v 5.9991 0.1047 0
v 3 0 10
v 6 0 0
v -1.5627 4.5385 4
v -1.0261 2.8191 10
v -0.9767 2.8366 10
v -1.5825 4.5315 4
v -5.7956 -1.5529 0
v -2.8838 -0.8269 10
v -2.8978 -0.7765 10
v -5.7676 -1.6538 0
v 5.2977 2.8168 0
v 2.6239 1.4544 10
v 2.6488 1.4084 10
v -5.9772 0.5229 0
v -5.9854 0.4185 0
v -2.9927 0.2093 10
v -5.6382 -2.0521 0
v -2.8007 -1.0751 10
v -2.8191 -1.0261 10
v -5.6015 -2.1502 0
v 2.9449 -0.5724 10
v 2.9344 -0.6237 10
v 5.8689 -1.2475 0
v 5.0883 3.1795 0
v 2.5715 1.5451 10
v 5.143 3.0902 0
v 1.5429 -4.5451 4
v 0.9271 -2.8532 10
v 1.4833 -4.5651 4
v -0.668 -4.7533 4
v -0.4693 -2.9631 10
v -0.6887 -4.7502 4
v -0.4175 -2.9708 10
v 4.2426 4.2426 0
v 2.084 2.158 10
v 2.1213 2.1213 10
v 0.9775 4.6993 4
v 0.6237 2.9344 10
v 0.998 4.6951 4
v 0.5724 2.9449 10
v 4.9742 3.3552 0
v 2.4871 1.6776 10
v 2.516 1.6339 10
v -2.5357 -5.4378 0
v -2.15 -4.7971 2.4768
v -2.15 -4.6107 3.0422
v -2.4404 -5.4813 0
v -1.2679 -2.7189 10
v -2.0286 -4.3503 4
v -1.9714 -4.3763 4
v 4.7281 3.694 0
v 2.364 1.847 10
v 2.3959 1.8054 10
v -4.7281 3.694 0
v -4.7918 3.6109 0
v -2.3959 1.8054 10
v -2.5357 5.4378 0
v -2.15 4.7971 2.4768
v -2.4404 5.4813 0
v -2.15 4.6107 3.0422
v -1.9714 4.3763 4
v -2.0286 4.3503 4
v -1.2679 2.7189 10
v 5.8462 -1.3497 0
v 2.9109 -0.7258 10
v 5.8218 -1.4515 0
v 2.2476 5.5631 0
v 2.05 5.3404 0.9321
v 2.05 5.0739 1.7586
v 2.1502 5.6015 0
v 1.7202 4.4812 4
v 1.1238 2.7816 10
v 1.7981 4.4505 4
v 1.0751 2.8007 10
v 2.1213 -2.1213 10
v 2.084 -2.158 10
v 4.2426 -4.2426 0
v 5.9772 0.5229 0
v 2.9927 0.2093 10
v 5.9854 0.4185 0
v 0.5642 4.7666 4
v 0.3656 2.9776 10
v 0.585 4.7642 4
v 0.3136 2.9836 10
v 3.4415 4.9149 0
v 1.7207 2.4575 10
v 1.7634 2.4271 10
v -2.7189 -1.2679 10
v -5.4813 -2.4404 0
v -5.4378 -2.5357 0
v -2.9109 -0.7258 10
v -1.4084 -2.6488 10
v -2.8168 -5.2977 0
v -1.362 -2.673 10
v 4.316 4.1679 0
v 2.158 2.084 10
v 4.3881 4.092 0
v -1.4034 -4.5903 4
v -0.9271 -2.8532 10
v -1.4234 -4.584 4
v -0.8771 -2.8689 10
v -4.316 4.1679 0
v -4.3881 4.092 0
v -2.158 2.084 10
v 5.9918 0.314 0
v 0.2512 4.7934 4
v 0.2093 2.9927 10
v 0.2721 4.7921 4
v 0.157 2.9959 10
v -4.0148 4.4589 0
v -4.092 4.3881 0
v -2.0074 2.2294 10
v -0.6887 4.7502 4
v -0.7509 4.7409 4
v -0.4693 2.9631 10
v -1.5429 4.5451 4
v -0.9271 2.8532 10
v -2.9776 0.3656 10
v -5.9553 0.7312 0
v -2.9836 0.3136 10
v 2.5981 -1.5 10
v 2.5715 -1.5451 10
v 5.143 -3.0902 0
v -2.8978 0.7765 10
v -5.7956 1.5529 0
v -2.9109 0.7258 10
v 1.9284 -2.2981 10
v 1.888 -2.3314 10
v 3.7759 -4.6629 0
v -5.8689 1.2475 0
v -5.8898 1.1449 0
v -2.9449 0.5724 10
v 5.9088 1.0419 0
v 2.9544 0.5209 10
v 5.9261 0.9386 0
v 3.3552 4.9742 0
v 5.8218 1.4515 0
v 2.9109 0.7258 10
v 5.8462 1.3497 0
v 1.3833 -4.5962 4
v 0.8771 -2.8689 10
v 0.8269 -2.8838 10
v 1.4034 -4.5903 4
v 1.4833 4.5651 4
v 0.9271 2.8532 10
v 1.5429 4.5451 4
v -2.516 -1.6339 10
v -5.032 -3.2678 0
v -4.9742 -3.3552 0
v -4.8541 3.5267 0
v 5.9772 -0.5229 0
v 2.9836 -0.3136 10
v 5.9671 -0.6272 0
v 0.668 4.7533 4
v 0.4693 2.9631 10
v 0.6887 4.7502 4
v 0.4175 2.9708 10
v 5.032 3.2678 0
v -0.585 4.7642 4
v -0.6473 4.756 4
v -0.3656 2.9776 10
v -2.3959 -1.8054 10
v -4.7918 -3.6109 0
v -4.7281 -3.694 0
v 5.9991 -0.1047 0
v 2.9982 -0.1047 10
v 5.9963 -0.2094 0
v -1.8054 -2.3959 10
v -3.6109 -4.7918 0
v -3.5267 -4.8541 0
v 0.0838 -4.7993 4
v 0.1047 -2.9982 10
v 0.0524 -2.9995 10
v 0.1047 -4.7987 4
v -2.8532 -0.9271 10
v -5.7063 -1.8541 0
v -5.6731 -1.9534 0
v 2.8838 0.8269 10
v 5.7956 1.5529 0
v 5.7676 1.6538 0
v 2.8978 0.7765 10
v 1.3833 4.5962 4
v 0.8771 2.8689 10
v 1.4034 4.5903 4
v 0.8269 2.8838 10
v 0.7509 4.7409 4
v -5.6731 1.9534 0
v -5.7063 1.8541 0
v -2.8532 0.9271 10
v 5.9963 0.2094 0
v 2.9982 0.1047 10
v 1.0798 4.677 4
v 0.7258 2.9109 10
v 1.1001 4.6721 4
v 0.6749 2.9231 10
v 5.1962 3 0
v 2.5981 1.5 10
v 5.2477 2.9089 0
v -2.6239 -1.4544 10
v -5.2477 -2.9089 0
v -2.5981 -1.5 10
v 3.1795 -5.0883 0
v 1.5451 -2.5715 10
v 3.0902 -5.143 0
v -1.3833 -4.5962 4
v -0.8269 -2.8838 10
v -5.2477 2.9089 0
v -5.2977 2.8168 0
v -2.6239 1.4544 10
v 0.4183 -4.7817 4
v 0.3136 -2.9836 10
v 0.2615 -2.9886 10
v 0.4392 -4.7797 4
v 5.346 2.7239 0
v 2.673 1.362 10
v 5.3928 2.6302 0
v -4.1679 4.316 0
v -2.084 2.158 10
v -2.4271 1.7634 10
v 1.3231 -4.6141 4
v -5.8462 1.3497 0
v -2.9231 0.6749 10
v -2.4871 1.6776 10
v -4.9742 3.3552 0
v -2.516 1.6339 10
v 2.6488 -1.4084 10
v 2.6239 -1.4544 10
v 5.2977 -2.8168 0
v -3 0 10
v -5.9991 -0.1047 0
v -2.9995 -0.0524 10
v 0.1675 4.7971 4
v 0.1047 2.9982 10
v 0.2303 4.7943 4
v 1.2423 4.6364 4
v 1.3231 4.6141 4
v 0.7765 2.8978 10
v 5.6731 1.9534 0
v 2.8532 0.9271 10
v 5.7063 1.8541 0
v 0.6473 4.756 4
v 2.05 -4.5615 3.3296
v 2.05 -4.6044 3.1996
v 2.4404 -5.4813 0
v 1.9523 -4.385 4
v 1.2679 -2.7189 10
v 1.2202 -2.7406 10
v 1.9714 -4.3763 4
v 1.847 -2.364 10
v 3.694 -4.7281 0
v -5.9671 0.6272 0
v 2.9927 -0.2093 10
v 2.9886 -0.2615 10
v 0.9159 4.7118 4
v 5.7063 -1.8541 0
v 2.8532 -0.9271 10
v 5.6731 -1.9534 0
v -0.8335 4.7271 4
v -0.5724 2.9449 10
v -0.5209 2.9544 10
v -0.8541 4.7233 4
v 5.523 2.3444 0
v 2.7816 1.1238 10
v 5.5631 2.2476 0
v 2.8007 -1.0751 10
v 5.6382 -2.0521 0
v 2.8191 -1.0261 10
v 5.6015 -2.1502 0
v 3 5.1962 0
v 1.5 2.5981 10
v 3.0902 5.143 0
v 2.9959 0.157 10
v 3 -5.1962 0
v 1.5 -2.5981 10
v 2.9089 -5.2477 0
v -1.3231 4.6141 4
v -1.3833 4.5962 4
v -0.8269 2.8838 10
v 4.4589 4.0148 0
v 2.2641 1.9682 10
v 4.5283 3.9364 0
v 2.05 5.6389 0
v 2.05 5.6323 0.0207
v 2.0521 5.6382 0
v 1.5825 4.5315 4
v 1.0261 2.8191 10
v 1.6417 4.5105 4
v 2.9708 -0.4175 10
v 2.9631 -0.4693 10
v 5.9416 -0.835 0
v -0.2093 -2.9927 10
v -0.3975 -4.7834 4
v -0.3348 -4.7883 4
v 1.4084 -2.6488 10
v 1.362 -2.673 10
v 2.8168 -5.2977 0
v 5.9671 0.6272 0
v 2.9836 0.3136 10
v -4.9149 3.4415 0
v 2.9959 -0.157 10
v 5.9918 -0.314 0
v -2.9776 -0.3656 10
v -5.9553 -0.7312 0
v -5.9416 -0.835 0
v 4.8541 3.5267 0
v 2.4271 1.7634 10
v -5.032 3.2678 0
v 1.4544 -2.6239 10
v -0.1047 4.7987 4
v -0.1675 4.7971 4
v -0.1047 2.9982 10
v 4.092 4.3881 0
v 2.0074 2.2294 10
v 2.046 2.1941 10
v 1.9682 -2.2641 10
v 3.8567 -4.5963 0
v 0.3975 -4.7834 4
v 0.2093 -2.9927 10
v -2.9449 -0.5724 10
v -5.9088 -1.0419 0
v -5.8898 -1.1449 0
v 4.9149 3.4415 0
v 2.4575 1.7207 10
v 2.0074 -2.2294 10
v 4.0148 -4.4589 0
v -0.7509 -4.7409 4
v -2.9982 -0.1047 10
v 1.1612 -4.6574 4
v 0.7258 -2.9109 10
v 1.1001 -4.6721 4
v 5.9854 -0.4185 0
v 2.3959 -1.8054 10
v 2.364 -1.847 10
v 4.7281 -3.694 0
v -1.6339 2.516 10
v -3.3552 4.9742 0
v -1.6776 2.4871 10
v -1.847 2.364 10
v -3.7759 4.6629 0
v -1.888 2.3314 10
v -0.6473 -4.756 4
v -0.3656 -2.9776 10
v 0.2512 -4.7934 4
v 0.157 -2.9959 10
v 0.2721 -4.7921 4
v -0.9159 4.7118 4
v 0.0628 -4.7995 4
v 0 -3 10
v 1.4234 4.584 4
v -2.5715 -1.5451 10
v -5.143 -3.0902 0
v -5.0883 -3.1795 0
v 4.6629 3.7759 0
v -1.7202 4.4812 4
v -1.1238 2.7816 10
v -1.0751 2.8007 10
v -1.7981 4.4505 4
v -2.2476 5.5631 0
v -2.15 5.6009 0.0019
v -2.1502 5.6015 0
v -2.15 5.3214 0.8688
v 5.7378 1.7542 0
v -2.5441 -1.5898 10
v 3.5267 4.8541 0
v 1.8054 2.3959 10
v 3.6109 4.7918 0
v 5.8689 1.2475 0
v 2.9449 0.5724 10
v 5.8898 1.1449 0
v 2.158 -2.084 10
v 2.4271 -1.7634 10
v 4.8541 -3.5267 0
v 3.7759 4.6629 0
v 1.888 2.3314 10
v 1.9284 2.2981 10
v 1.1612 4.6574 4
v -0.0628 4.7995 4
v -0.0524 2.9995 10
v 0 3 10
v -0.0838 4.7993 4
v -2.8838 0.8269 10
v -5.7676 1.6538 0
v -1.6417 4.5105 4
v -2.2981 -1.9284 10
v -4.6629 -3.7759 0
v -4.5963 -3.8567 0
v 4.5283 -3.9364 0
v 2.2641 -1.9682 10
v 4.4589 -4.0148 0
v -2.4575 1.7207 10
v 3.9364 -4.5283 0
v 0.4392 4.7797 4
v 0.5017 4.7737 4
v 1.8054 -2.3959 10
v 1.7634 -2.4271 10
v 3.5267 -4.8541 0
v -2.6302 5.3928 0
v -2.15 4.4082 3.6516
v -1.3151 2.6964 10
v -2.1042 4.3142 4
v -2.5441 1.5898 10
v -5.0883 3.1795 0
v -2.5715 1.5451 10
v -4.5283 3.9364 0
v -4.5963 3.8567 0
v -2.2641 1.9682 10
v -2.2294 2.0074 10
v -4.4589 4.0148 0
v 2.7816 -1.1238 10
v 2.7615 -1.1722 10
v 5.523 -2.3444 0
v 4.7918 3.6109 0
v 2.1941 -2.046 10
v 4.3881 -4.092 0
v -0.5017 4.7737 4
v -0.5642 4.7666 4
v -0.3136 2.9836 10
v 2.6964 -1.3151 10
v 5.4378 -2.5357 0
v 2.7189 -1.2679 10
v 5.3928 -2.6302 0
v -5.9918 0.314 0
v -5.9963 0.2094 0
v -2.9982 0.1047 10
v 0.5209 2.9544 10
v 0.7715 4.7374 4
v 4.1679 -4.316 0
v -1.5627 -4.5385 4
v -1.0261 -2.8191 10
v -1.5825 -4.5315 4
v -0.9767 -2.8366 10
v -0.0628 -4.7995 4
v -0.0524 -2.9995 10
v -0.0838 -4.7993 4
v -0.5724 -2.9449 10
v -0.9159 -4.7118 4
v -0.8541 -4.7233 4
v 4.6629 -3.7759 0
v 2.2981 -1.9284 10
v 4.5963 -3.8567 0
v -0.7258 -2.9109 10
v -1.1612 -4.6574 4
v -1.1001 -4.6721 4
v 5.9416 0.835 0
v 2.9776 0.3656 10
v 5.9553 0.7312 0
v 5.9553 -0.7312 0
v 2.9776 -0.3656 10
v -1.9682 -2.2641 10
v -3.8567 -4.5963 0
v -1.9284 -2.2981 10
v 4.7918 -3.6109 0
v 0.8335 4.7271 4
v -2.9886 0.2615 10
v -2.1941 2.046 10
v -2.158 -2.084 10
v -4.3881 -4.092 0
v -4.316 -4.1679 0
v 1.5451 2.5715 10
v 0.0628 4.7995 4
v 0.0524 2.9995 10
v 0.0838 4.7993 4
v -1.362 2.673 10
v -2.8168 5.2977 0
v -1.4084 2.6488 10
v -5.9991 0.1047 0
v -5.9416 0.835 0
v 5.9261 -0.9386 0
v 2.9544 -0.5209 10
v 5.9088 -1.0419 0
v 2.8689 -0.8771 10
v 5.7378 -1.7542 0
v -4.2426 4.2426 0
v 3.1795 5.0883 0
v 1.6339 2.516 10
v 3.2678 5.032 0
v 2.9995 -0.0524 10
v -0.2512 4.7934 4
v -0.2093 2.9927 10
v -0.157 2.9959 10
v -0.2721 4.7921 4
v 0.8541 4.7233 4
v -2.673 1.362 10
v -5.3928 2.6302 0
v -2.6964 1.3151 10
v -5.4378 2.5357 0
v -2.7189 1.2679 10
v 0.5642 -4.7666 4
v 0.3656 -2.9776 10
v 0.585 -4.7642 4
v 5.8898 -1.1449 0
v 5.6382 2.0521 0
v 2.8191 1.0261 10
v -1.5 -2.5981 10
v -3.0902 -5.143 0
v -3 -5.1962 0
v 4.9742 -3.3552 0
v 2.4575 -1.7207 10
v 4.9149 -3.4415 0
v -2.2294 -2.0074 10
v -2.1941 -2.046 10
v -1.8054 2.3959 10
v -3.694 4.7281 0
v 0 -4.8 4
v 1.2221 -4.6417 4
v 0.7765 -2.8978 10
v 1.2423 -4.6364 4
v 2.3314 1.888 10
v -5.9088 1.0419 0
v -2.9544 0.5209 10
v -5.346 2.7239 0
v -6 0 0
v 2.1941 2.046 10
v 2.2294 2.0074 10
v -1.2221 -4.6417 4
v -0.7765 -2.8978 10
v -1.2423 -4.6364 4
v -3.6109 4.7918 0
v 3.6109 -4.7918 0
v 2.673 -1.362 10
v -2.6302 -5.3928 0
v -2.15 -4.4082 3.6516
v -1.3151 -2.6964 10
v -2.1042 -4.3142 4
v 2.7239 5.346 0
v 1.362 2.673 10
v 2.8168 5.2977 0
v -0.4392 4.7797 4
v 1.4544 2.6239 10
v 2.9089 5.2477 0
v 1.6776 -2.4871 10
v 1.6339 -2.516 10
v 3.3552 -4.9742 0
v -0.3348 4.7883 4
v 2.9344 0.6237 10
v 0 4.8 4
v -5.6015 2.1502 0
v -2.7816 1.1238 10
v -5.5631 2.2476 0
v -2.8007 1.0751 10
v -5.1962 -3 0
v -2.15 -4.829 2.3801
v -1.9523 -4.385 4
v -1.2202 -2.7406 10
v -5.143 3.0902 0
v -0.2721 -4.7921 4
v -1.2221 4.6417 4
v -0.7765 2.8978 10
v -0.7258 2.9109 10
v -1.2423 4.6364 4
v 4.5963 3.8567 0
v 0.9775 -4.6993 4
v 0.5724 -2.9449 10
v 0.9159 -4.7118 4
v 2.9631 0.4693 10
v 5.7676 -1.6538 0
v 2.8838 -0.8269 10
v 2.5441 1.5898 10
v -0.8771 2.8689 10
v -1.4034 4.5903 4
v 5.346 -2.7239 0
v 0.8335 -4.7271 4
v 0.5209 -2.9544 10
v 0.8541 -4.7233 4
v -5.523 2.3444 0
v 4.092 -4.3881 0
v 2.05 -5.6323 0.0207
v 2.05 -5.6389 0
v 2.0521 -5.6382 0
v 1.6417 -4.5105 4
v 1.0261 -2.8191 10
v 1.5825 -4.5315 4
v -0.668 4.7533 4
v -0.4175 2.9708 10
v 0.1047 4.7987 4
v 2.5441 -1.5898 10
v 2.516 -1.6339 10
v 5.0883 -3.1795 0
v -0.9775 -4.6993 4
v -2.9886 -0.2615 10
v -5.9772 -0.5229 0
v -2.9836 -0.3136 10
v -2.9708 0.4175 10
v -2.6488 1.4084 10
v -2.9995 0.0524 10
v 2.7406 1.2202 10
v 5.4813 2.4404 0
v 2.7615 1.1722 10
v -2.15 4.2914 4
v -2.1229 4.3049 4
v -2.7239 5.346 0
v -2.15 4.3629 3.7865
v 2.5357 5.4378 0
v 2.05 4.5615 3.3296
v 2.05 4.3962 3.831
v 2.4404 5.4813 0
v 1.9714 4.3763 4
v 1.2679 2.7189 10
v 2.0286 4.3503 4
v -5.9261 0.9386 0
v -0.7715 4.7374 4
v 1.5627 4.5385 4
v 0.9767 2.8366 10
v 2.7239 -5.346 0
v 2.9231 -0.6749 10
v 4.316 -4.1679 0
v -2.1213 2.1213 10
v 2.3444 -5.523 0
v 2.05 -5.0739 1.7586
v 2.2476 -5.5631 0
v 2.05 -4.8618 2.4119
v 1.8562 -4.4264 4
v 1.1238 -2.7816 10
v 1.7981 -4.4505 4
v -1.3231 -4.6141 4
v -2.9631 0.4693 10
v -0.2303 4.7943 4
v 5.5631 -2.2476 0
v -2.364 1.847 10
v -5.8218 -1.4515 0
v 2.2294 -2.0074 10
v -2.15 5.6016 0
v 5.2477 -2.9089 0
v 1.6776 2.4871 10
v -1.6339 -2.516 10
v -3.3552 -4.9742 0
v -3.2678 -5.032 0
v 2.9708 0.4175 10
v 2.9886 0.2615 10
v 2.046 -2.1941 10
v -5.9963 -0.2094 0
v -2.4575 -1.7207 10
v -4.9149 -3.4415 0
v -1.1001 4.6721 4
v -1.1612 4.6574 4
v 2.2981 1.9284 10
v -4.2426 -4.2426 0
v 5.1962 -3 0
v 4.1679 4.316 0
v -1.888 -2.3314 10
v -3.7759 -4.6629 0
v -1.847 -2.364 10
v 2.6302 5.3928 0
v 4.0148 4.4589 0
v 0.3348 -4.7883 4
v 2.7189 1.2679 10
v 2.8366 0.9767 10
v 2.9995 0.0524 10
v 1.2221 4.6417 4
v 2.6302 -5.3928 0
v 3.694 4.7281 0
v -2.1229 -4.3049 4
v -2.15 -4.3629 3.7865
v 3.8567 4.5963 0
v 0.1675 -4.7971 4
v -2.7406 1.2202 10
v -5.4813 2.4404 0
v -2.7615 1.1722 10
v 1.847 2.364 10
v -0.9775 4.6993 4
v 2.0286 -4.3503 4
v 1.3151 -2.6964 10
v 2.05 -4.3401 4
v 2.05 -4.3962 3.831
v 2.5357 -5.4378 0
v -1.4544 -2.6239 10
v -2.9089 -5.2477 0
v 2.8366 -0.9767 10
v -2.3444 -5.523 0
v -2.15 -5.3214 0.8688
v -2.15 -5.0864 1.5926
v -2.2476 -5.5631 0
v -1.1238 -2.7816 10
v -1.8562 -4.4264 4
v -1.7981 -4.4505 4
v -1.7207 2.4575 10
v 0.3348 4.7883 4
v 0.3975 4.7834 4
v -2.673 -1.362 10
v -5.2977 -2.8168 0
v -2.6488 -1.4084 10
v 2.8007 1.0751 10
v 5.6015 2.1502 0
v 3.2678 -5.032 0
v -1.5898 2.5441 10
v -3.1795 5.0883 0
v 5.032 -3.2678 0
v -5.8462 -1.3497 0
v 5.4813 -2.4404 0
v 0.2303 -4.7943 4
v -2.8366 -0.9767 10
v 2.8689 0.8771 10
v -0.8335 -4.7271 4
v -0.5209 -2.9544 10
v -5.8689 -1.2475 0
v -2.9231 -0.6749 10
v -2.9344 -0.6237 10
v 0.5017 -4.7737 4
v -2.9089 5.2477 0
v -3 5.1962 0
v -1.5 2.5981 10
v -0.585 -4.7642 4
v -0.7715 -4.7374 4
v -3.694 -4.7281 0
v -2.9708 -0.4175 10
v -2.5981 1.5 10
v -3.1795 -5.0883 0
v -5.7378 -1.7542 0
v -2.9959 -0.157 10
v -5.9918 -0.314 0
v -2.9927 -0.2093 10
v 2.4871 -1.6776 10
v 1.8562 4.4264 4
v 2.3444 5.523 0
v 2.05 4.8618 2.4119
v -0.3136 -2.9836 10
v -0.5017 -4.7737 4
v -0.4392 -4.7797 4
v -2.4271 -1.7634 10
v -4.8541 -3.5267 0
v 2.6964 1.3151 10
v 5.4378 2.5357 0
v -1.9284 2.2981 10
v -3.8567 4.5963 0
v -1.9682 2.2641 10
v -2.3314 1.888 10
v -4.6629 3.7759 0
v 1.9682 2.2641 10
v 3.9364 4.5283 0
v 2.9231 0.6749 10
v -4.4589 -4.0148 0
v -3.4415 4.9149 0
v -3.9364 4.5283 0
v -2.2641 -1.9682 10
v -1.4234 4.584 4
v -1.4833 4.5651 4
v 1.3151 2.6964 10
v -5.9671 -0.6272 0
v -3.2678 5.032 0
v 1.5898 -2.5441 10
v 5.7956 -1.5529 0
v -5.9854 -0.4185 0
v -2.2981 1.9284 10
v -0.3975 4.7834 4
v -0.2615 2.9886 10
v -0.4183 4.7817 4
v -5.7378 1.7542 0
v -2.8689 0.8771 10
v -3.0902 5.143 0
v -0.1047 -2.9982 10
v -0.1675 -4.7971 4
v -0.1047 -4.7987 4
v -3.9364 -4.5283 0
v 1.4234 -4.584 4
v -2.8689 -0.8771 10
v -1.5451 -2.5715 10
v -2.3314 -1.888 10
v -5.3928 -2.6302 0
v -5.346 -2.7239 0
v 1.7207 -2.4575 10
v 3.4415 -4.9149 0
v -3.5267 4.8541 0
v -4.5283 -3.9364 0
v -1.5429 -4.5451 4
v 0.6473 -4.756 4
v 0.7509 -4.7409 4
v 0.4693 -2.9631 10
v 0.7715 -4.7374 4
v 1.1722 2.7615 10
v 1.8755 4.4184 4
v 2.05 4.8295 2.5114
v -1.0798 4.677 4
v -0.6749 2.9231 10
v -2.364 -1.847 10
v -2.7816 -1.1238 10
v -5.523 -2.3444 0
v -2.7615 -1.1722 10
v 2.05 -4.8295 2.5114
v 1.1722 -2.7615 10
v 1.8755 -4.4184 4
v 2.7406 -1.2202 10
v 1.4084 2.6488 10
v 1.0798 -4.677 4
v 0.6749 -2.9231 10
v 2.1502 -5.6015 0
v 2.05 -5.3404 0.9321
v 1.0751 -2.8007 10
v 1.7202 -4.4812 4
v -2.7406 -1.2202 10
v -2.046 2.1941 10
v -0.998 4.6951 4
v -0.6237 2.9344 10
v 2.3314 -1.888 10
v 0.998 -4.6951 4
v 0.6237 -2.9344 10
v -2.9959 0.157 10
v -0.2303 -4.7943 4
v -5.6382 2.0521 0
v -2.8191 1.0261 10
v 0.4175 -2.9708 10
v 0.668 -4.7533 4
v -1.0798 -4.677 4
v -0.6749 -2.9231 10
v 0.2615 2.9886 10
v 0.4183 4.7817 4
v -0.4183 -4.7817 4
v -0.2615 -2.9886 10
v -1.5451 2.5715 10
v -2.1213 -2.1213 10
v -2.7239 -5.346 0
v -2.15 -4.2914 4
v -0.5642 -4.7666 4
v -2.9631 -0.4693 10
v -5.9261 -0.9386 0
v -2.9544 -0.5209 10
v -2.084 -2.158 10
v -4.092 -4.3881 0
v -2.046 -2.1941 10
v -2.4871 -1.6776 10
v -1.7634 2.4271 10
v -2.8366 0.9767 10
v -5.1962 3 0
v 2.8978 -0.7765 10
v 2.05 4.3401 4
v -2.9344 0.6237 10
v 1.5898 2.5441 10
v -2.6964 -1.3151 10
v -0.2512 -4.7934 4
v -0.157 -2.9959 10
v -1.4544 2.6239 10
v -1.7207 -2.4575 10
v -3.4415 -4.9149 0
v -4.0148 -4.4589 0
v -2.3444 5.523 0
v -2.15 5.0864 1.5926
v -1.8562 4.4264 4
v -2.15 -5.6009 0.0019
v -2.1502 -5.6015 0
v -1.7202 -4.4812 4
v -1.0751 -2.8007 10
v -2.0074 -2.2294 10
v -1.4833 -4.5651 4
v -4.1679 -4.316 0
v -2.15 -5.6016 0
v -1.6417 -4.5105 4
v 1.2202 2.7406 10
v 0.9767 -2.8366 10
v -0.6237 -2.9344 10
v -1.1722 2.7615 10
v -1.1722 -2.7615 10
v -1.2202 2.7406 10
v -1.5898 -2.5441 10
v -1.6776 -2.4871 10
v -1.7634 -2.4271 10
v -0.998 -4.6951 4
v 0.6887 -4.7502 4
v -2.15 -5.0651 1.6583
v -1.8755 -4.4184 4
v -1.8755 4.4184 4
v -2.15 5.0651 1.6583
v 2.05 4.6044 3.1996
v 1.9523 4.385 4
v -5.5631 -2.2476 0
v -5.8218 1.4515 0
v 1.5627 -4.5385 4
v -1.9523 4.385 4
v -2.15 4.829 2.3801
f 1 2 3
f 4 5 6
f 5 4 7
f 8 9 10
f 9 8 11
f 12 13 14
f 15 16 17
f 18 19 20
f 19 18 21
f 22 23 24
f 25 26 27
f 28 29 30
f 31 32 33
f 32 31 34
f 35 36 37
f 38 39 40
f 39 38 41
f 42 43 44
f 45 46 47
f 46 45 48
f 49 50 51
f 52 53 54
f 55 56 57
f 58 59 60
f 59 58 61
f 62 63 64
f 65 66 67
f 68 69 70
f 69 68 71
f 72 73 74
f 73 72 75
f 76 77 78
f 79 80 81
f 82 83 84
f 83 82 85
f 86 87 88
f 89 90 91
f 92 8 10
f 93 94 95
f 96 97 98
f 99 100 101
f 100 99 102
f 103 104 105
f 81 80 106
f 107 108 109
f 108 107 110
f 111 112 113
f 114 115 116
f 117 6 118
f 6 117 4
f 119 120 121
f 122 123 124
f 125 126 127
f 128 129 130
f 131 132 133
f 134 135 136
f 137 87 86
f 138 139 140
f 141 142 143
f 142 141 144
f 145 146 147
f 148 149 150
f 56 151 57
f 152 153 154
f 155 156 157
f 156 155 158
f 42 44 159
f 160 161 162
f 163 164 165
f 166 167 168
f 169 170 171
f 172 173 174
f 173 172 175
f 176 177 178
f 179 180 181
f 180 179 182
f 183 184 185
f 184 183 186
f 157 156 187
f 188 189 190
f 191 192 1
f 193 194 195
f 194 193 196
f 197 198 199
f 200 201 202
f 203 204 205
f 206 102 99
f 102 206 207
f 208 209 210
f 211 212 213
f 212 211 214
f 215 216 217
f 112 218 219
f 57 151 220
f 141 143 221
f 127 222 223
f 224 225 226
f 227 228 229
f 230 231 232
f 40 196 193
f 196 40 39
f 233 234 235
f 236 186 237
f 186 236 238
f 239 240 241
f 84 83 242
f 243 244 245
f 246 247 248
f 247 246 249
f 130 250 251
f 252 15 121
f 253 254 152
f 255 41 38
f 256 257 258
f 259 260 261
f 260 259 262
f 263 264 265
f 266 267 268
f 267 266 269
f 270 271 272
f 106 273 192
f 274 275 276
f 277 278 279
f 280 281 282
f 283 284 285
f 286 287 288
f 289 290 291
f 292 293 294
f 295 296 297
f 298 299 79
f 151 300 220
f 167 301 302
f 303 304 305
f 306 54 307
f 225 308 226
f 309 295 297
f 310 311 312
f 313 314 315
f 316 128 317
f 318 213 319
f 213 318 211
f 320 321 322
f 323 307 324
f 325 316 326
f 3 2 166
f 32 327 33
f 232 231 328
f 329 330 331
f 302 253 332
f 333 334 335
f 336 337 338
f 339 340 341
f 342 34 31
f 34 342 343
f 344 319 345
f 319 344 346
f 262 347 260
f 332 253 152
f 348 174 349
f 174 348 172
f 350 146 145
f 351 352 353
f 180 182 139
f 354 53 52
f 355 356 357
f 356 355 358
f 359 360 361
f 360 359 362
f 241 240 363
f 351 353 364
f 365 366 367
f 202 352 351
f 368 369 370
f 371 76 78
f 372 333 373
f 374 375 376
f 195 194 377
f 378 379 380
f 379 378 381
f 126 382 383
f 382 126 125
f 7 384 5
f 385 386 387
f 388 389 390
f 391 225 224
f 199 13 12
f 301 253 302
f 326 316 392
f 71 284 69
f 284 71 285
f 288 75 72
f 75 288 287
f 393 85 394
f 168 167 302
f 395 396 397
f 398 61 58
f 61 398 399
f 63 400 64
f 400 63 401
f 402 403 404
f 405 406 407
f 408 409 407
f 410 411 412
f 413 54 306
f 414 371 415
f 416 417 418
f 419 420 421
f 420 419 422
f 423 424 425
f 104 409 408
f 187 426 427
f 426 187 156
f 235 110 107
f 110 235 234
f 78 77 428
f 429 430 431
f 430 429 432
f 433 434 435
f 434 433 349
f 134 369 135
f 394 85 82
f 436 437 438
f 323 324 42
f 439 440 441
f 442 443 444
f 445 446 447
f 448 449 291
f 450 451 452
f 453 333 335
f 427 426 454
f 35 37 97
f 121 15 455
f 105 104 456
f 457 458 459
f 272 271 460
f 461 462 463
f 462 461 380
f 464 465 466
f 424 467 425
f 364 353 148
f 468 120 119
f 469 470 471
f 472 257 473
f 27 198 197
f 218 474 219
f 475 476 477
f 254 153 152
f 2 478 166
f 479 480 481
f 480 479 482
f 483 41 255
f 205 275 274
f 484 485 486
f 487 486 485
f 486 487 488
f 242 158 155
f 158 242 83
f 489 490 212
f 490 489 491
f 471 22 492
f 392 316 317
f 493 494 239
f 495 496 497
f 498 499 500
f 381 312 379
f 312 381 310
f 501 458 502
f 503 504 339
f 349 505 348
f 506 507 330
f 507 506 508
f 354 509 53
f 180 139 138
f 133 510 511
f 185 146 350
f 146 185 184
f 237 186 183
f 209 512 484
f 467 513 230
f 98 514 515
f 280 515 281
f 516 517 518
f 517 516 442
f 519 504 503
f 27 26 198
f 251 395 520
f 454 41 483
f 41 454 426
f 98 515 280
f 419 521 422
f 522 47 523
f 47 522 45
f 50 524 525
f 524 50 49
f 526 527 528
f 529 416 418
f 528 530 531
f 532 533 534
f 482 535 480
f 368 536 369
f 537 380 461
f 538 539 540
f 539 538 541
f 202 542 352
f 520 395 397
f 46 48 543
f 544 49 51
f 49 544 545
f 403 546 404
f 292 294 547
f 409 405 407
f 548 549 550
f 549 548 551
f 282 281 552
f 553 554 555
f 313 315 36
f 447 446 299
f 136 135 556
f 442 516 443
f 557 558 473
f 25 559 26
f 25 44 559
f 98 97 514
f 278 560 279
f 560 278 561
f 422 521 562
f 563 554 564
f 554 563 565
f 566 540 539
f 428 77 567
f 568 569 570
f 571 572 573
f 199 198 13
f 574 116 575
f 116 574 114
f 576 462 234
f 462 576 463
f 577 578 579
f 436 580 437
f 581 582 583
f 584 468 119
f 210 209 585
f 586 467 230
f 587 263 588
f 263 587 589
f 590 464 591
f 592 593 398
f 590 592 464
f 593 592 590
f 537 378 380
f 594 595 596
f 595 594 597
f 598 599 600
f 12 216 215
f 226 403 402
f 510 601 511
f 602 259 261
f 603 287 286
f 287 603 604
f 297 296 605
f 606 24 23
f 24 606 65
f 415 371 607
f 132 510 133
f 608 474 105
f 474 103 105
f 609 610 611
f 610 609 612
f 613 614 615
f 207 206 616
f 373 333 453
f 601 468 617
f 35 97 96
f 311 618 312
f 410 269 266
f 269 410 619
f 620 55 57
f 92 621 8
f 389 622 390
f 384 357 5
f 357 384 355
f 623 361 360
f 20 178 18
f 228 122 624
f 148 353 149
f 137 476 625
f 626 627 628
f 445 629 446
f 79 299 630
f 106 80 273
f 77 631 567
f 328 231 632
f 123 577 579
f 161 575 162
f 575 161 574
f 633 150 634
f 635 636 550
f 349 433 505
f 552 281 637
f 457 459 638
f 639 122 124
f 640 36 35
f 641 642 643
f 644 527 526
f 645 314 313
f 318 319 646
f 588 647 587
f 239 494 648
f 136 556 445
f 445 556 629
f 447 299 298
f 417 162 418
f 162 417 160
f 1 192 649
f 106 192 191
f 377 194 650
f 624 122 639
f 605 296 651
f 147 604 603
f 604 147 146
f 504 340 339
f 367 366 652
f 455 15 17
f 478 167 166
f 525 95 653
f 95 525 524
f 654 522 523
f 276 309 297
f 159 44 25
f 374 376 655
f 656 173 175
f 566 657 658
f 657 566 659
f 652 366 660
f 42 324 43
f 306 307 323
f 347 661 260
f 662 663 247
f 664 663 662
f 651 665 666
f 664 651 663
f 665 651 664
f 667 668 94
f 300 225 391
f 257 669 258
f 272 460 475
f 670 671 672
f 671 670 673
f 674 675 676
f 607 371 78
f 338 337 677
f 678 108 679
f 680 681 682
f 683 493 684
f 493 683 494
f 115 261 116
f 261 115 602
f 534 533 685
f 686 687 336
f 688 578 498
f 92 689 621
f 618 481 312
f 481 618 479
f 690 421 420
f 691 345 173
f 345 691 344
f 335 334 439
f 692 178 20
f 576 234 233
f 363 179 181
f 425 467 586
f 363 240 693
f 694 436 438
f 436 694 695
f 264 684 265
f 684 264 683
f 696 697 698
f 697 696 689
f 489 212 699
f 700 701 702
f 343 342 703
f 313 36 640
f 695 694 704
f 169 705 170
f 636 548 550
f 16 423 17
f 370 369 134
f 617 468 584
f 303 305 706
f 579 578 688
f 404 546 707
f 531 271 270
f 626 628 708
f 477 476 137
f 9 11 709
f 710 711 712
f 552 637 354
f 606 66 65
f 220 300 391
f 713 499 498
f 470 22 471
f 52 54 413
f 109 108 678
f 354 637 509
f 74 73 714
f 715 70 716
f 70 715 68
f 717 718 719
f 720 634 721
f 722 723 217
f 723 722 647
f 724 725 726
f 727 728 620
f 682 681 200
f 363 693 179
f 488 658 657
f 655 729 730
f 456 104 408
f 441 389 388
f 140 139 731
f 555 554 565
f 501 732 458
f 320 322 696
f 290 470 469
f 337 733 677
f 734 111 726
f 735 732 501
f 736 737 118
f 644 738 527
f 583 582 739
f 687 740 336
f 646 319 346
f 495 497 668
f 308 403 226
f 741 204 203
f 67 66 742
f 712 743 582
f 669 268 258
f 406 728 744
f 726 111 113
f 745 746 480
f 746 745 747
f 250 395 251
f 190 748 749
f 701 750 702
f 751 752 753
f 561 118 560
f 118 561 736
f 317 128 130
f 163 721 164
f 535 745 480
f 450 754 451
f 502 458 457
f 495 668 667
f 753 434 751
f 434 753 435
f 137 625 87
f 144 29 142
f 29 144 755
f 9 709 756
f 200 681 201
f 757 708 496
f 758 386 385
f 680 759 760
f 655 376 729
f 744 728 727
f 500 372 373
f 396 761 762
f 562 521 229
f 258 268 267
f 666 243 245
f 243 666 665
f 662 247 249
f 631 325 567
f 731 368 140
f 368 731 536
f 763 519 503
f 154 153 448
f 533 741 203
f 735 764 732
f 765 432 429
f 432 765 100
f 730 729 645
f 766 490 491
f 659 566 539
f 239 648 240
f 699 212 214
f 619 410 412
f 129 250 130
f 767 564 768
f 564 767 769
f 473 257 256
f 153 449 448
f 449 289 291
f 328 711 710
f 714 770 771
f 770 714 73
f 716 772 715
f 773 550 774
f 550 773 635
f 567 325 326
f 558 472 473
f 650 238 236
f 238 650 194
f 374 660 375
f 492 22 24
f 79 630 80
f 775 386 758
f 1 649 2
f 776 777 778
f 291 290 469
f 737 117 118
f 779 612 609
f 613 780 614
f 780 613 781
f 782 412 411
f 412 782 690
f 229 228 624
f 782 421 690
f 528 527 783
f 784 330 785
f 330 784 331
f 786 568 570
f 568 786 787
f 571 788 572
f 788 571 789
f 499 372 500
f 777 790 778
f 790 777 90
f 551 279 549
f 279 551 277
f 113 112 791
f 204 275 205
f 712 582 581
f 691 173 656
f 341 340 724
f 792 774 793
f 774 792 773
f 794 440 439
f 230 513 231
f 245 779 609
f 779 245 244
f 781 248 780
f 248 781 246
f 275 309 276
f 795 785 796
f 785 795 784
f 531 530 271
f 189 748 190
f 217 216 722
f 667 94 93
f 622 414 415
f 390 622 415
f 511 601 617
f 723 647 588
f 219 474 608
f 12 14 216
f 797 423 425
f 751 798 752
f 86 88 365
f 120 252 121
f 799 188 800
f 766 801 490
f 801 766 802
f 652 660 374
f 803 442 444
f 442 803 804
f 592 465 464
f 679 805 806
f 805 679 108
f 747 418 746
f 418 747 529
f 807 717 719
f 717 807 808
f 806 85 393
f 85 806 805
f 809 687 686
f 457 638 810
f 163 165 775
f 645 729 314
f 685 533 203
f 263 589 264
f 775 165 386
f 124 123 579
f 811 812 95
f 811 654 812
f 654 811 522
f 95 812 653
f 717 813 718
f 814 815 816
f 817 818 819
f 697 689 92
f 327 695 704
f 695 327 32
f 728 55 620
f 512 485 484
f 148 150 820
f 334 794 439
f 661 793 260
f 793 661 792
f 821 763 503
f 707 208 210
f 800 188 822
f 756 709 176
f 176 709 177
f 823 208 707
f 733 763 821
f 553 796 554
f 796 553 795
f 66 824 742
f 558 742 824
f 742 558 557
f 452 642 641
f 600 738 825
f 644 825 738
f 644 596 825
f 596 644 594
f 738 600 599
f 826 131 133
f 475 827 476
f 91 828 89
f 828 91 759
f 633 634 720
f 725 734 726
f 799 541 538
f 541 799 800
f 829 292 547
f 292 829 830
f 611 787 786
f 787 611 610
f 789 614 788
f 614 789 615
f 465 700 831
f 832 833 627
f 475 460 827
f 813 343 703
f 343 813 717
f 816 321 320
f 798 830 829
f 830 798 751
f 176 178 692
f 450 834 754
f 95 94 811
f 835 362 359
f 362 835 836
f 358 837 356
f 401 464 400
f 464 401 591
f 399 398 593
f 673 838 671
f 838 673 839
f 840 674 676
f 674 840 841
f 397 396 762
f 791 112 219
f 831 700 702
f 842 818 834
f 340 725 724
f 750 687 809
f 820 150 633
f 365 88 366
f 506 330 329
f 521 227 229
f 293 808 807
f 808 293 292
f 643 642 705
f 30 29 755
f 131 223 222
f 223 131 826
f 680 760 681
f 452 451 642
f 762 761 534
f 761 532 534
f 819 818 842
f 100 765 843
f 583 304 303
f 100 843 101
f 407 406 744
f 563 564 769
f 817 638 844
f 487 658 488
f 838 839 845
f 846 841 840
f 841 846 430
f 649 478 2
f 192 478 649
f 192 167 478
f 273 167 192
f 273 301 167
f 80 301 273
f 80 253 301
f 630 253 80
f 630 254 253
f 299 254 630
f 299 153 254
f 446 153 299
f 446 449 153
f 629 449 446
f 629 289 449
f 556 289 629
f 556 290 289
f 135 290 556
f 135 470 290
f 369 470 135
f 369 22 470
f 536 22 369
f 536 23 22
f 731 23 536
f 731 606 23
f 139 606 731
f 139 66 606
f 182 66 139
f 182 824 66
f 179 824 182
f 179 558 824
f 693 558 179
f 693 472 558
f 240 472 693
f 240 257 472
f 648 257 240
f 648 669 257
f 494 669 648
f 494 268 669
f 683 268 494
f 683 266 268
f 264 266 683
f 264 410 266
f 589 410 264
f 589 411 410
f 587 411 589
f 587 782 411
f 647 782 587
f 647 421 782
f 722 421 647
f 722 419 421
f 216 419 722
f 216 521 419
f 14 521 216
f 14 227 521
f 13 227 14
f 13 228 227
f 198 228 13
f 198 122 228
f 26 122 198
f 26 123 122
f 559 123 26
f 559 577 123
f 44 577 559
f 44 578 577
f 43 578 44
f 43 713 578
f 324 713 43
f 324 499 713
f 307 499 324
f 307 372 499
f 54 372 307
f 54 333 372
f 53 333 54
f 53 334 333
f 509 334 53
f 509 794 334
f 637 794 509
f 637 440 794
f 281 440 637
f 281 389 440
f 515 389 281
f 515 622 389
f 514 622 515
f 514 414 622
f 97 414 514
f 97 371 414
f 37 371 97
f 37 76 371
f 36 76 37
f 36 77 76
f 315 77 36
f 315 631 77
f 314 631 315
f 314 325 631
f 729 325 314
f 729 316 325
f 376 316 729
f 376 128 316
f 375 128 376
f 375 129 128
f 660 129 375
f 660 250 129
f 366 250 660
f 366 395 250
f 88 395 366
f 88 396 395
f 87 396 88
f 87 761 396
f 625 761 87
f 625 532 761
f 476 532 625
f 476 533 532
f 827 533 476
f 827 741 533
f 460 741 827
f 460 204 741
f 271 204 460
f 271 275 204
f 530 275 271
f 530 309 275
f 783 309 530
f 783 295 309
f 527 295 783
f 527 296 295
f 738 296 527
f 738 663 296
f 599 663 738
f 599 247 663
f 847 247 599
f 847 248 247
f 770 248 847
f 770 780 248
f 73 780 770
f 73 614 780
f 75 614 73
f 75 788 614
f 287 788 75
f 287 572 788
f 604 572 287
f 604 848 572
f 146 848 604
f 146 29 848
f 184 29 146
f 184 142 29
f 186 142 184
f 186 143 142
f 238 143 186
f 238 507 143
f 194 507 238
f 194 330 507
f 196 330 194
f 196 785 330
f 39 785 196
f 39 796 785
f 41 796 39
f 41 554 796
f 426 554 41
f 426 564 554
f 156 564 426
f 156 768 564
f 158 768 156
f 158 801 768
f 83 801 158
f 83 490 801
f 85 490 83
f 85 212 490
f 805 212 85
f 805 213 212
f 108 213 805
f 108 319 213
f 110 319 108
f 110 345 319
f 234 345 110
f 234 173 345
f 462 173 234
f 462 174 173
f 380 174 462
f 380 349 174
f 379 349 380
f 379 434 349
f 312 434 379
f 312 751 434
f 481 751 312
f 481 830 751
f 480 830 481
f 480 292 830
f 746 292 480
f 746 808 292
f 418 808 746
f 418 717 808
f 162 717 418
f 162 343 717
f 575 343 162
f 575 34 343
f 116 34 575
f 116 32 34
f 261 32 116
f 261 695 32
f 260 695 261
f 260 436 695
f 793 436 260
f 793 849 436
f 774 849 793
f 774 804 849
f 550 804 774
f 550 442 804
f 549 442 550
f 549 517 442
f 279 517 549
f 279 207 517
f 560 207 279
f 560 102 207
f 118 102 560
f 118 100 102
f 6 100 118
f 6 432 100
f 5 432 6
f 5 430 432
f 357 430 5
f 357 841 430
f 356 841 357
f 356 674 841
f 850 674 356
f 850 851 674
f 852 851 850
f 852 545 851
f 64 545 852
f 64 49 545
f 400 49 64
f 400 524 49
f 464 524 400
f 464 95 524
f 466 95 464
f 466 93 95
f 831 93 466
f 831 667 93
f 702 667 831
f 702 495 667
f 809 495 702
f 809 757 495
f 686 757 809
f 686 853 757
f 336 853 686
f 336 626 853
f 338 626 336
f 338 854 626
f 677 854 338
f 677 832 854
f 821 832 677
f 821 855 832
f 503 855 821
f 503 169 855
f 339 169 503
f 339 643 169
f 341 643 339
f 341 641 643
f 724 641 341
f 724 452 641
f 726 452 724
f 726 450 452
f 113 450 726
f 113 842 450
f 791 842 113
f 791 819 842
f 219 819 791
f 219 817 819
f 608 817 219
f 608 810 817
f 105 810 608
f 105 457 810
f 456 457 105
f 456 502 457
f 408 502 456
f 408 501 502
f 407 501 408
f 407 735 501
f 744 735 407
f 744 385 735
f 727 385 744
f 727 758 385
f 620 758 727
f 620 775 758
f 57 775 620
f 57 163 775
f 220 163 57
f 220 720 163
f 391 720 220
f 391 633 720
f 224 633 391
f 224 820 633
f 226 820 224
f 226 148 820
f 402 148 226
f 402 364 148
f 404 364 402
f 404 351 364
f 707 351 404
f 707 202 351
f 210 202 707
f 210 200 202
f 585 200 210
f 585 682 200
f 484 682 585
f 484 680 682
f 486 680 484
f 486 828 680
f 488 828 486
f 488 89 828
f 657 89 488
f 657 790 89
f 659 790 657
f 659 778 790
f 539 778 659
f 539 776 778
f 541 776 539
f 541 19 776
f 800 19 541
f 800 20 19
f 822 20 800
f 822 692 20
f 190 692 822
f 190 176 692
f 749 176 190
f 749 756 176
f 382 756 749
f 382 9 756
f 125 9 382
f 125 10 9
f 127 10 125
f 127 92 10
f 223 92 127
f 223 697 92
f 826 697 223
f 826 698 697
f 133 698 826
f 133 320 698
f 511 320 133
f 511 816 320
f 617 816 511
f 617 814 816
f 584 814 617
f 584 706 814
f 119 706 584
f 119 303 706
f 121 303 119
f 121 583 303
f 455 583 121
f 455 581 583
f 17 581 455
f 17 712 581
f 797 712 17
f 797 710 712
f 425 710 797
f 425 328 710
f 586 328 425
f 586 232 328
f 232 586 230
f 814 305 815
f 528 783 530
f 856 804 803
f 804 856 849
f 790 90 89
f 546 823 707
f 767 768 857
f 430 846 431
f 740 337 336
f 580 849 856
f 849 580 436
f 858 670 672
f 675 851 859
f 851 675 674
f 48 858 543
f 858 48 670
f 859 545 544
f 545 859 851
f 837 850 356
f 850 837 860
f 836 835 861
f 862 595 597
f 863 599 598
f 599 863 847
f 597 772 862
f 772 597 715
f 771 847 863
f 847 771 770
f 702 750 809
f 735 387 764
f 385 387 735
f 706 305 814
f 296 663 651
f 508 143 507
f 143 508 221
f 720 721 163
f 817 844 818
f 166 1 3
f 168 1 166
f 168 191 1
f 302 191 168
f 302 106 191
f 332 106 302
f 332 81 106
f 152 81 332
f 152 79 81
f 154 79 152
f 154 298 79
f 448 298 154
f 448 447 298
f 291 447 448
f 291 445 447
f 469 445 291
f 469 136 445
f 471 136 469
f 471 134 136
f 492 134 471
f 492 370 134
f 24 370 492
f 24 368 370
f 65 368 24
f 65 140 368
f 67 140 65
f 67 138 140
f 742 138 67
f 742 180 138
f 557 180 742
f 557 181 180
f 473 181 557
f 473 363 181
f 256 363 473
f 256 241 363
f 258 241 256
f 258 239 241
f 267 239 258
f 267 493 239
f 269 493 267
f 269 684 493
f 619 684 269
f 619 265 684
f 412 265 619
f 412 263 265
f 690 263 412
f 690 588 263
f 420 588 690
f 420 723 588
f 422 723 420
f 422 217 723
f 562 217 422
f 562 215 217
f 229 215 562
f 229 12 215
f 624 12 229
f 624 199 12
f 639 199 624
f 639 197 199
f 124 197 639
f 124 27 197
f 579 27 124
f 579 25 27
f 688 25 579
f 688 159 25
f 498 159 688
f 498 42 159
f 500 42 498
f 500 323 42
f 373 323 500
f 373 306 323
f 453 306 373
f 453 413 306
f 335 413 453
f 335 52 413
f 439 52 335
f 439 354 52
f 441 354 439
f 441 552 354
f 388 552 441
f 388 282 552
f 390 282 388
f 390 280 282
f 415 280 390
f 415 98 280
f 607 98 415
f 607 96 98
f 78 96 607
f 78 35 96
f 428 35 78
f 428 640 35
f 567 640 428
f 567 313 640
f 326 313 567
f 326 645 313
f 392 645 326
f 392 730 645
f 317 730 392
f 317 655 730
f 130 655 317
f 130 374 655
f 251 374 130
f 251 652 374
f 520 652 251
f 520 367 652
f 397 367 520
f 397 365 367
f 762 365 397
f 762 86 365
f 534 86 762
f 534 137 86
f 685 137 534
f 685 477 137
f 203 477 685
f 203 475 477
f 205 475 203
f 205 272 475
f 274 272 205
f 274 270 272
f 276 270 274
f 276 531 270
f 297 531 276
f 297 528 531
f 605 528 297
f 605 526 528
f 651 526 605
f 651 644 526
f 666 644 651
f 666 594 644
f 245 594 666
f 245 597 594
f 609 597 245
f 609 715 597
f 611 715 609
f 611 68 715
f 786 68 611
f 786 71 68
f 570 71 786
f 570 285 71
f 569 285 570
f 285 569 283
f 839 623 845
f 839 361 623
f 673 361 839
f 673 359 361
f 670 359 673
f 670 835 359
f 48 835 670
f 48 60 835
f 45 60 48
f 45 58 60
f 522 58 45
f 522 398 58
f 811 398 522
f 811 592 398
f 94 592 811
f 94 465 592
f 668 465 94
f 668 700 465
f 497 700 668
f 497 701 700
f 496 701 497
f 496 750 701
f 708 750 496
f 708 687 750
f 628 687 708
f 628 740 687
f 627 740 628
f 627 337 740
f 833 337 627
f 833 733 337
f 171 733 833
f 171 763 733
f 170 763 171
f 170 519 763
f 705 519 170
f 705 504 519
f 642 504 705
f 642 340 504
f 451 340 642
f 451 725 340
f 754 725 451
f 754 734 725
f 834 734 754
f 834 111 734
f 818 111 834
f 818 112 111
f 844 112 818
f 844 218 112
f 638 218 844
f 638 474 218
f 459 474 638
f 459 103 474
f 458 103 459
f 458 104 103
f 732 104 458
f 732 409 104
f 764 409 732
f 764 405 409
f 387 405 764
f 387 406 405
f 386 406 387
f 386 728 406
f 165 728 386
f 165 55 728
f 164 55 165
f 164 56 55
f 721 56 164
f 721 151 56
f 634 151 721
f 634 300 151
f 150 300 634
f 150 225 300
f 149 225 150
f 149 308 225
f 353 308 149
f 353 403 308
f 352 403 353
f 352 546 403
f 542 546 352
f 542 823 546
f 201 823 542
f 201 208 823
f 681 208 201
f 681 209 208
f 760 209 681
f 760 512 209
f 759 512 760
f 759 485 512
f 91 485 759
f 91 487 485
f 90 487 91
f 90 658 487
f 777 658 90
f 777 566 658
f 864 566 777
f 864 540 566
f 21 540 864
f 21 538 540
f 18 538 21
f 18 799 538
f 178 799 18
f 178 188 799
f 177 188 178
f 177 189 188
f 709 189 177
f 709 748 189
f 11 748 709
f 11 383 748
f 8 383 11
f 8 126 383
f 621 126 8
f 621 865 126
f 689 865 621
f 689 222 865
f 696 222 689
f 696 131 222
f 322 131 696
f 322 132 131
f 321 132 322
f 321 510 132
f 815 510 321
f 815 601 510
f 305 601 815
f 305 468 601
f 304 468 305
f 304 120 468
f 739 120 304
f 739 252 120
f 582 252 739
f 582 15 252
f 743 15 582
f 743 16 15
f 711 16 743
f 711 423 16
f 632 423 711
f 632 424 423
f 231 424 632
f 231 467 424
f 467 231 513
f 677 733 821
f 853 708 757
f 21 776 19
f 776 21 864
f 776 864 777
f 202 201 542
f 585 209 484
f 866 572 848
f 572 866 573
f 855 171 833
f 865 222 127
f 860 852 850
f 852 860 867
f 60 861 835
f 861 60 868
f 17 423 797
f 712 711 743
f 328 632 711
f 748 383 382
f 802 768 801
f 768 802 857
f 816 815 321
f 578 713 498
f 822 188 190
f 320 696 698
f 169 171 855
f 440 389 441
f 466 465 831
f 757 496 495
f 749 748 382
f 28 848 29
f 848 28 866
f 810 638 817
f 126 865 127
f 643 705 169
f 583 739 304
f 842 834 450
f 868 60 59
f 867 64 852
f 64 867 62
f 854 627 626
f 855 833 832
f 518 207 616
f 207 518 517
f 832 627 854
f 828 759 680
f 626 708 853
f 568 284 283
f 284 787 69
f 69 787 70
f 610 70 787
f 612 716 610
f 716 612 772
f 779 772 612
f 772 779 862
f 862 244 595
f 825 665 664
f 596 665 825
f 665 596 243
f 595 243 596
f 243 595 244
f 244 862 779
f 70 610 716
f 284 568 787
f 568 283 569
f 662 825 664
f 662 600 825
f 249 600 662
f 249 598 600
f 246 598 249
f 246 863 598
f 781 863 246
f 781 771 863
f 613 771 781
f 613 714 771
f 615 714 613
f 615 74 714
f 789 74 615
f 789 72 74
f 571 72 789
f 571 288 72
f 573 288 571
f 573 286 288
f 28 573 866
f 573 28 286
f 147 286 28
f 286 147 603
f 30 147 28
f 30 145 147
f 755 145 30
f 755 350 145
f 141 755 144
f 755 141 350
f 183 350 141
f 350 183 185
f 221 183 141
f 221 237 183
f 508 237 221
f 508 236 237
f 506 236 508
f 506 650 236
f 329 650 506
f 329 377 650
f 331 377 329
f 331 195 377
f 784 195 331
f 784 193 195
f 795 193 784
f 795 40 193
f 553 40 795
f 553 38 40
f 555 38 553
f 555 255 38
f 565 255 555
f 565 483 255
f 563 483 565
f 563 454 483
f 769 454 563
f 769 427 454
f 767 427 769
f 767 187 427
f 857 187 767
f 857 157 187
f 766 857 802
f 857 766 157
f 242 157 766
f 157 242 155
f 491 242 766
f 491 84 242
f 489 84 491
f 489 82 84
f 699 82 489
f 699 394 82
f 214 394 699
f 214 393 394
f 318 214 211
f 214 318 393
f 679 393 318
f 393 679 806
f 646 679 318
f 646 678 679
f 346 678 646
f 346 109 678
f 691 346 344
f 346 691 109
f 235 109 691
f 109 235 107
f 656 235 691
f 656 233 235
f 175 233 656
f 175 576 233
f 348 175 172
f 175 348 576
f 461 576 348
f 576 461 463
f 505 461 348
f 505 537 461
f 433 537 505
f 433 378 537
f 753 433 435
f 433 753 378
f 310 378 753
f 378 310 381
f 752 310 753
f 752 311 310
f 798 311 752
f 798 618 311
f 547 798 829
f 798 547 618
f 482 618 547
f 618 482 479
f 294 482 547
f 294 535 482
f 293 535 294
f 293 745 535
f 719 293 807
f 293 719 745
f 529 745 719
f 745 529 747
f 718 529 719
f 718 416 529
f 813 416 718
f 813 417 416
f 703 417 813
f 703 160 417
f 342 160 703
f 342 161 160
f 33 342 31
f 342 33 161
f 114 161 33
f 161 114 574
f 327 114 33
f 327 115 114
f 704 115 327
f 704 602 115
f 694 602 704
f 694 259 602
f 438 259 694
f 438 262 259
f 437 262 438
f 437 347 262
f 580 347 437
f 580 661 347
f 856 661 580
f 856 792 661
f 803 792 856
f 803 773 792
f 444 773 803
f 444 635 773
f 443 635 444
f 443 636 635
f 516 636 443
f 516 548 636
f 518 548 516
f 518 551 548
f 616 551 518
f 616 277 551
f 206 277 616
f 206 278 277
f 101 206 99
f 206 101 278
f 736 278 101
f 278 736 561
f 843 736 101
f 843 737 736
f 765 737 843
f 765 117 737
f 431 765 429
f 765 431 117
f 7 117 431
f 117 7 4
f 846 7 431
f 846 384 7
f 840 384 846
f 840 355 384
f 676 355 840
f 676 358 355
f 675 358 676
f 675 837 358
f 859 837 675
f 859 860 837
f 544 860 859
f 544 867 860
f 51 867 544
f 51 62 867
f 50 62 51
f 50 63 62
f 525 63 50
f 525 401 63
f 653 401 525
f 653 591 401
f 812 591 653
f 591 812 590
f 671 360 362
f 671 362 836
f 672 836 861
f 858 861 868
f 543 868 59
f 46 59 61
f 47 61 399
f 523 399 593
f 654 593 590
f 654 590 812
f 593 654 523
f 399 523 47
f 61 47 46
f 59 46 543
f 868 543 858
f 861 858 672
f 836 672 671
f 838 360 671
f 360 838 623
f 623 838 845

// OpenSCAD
difference() {
    cylinder(10, 6, 3, $fn=360);
translate([-0.05,0,1.95]) cube([4.2,24,4.1],center=true);
}
